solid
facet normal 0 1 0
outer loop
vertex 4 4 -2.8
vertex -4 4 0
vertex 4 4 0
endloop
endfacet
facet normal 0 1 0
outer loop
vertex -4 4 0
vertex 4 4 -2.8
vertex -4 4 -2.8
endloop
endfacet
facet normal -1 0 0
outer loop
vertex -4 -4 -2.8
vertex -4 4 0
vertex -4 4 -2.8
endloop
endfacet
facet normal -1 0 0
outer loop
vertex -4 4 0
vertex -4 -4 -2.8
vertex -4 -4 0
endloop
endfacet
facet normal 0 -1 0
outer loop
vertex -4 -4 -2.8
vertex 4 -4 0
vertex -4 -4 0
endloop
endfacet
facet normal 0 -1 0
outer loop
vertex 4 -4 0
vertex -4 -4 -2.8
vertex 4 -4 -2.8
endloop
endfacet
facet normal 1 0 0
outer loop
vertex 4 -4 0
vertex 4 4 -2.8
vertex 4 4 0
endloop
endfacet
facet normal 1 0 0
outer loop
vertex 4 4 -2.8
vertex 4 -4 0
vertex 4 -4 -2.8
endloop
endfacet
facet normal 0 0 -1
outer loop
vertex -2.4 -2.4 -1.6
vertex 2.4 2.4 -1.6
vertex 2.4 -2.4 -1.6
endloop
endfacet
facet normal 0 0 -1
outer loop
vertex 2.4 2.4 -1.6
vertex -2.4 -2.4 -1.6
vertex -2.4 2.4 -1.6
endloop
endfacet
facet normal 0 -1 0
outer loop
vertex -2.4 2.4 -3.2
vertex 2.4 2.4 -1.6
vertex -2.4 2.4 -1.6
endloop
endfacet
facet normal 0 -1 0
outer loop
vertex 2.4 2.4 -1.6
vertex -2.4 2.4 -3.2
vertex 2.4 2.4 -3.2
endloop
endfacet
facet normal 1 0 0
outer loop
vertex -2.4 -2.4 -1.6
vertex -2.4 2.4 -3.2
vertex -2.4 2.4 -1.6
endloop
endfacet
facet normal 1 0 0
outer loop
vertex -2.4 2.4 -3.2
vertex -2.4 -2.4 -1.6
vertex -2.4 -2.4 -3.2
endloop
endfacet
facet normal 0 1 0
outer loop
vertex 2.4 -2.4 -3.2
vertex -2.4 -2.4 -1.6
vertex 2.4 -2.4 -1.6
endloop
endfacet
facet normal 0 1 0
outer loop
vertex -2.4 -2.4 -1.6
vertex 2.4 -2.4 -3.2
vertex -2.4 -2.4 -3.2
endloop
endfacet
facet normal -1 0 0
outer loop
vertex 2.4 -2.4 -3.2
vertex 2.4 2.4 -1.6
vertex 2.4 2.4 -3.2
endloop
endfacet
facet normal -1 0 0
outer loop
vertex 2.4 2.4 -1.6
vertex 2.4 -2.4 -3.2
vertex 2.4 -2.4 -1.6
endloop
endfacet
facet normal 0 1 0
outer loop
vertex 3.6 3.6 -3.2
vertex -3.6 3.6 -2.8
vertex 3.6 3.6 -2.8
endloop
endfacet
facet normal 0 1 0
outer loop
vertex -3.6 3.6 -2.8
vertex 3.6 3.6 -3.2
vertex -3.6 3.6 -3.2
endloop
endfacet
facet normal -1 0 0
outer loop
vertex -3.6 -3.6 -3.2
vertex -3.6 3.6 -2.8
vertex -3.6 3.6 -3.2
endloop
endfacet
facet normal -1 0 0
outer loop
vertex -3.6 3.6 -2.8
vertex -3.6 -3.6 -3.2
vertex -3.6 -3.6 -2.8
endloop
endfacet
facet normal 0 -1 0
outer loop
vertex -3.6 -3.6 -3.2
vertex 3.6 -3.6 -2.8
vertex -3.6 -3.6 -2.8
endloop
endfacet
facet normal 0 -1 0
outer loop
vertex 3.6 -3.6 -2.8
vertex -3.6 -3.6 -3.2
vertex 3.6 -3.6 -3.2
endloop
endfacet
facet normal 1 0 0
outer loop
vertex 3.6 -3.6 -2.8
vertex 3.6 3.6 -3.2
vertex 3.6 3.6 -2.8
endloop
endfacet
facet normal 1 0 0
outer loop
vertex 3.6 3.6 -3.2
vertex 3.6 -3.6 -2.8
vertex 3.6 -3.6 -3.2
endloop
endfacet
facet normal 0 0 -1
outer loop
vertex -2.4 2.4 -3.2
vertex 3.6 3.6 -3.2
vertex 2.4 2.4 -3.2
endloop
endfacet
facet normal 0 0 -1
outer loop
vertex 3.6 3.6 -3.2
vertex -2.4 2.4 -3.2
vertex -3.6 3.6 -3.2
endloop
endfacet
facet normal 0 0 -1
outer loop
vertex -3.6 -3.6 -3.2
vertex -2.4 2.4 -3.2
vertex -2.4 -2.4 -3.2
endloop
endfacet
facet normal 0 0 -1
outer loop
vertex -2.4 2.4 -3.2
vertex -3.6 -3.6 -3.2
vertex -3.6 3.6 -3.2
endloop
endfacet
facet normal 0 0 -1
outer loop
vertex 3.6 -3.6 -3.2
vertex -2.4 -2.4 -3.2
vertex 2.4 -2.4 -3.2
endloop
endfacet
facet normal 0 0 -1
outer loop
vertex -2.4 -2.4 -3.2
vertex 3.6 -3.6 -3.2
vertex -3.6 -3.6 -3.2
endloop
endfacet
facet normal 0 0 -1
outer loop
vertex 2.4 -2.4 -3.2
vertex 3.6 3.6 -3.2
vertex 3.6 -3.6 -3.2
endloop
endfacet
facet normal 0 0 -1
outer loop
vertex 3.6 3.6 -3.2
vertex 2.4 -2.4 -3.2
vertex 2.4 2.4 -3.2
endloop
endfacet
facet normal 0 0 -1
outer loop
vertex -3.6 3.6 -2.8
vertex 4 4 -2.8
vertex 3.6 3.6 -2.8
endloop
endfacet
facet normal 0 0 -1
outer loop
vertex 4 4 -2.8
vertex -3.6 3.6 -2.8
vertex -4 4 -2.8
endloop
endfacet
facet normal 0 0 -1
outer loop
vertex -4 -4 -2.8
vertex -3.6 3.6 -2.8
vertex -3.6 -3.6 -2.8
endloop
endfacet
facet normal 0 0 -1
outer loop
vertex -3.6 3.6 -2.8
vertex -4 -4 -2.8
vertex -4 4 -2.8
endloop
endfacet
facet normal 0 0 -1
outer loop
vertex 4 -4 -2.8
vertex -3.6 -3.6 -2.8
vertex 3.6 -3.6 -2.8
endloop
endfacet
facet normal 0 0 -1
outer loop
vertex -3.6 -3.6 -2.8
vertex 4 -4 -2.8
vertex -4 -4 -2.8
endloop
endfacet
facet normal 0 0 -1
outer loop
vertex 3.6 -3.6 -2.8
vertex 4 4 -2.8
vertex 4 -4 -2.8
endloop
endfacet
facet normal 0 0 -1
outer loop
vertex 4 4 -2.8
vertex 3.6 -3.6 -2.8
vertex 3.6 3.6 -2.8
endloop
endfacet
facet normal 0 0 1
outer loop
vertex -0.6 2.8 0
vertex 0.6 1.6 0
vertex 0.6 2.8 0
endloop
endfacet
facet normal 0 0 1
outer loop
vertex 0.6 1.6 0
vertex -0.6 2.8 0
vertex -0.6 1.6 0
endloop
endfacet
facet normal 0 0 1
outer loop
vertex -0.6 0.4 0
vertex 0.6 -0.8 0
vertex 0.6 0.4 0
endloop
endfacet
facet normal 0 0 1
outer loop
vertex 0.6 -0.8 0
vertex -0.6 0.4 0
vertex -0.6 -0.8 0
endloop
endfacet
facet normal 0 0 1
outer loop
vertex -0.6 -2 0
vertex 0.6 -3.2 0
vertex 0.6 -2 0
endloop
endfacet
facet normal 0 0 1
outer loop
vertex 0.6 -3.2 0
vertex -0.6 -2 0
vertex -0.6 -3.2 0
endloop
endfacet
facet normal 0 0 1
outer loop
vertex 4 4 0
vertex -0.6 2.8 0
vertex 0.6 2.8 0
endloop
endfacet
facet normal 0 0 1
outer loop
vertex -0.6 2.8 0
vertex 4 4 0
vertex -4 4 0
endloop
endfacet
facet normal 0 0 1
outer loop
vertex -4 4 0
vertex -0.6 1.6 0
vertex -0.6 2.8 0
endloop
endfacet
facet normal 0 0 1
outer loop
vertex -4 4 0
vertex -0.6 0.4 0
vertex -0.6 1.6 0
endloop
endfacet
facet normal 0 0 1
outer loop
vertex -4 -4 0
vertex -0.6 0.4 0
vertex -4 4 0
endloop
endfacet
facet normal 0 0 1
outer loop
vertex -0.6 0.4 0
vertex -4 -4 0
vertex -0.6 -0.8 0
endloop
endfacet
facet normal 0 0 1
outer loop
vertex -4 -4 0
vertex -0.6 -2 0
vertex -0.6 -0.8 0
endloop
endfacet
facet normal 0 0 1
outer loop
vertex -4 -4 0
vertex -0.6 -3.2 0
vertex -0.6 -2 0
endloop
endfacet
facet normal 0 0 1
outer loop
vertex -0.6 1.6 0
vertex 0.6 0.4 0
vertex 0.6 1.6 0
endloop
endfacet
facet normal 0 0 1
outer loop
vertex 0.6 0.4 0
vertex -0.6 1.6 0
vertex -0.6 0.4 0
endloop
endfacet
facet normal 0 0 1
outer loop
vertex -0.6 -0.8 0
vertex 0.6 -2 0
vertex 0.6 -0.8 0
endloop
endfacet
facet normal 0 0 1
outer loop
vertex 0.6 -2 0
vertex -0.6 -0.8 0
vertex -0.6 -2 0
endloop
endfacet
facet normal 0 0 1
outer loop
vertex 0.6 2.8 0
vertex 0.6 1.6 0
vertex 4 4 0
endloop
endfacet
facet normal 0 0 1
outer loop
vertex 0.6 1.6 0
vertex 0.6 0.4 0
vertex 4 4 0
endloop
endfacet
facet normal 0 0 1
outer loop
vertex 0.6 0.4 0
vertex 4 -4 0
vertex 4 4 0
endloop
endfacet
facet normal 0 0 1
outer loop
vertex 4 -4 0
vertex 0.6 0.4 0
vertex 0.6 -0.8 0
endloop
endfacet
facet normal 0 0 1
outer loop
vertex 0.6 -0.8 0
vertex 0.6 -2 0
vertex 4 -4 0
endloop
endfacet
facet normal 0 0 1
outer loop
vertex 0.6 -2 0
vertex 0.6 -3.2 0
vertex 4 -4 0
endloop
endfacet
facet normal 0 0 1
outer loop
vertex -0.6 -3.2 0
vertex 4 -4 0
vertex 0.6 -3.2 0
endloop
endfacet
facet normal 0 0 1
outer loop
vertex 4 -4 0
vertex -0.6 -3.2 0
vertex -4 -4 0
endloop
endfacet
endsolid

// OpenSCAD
// file: ../p/box5.scad
use <../lib.scad>
function ldraw_lib__box5() = [
// 0 Box with 5 Faces and All Edges
// 0 Name: box5.dat
// 0 Author: James Jessiman
// 0 !LDRAW_ORG Primitive UPDATE 2012-01
// 0 !LICENSE Licensed under CC BY 4.0 : see CAreadme.txt
// 
// 0 BFC CERTIFY CCW
  [0,"BFC","CERTIFY"],
  [0,"BFC","CCW"],
// 
// 0 !HISTORY 2002-04-03 [sbliss] Modified for BFC compliance
// 0 !HISTORY 2002-04-25 [PTadmin] Official Update 2002-02
// 0 !HISTORY 2007-06-24 [PTadmin] Header formatted for Contributor Agreement
// 0 !HISTORY 2008-07-01 [PTadmin] Official Update 2008-01
// 0 !HISTORY 2012-02-16 [Philo] Changed to CCW
// 0 !HISTORY 2012-03-30 [PTadmin] Official Update 2012-01
// 
// 
// 2 24 1 1 1 -1 1 1
  [2,24,1,1,1,-1,1,1],
// 2 24 -1 1 1 -1 1 -1
  [2,24,-1,1,1,-1,1,-1],
// 2 24 -1 1 -1 1 1 -1
  [2,24,-1,1,-1,1,1,-1],
// 2 24 1 1 -1 1 1 1
  [2,24,1,1,-1,1,1,1],
// 2 24 1 0 1 -1 0 1
  [2,24,1,0,1,-1,0,1],
// 2 24 -1 0 1 -1 0 -1
  [2,24,-1,0,1,-1,0,-1],
// 2 24 -1 0 -1 1 0 -1
  [2,24,-1,0,-1,1,0,-1],
// 2 24 1 0 -1 1 0 1
  [2,24,1,0,-1,1,0,1],
// 2 24 1 0 1 1 1 1
  [2,24,1,0,1,1,1,1],
// 2 24 -1 0 1 -1 1 1
  [2,24,-1,0,1,-1,1,1],
// 2 24 1 0 -1 1 1 -1
  [2,24,1,0,-1,1,1,-1],
// 2 24 -1 0 -1 -1 1 -1
  [2,24,-1,0,-1,-1,1,-1],
// 4 16 -1 1 1 1 1 1 1 1 -1 -1 1 -1
  [4,16,-1,1,1,1,1,1,1,1,-1,-1,1,-1],
// 4 16 -1 1 1 -1 0 1 1 0 1 1 1 1
  [4,16,-1,1,1,-1,0,1,1,0,1,1,1,1],
// 4 16 -1 1 -1 -1 0 -1 -1 0 1 -1 1 1
  [4,16,-1,1,-1,-1,0,-1,-1,0,1,-1,1,1],
// 4 16 1 1 -1 1 0 -1 -1 0 -1 -1 1 -1
  [4,16,1,1,-1,1,0,-1,-1,0,-1,-1,1,-1],
// 4 16 1 1 1 1 0 1 1 0 -1 1 1 -1
  [4,16,1,1,1,1,0,1,1,0,-1,1,1,-1],
];
module ldraw_lib__box5(step=0, col=false, unit=2/5, alt=false, line=0.2, solid=!$preview)
    makepoly(ldraw_lib__box5(), step=step, col=col, unit=unit, alt=alt, line=line, solid=solid);
ldraw_lib__box5(line=0.2);
// file: ../p/box4.scad
use <../lib.scad>
function ldraw_lib__box4() = [
// 0 Box with 4 Faces (2 Parallel Pairs) and All Edges
// 0 Name: box4.dat
// 0 Author: James Jessiman
// 0 !LDRAW_ORG Primitive UPDATE 2012-01
// 0 !LICENSE Licensed under CC BY 4.0 : see CAreadme.txt
// 
// 0 BFC CERTIFY CCW
  [0,"BFC","CERTIFY"],
  [0,"BFC","CCW"],
// 
// 0 !HISTORY 2002-04-03 [sbliss] Modified for BFC compliance
// 0 !HISTORY 2002-04-25 [PTadmin] Official Update 2002-02
// 0 !HISTORY 2007-06-24 [PTadmin] Header formatted for Contributor Agreement
// 0 !HISTORY 2008-07-01 [PTadmin] Official Update 2008-01
// 0 !HISTORY 2012-02-16 [Philo] Changed to CCW
// 0 !HISTORY 2012-03-30 [PTadmin] Official Update 2012-01
// 
// 
// 2 24 1 1 1 -1 1 1
  [2,24,1,1,1,-1,1,1],
// 2 24 -1 1 1 -1 1 -1
  [2,24,-1,1,1,-1,1,-1],
// 2 24 -1 1 -1 1 1 -1
  [2,24,-1,1,-1,1,1,-1],
// 2 24 1 1 -1 1 1 1
  [2,24,1,1,-1,1,1,1],
// 2 24 1 0 1 -1 0 1
  [2,24,1,0,1,-1,0,1],
// 2 24 -1 0 1 -1 0 -1
  [2,24,-1,0,1,-1,0,-1],
// 2 24 -1 0 -1 1 0 -1
  [2,24,-1,0,-1,1,0,-1],
// 2 24 1 0 -1 1 0 1
  [2,24,1,0,-1,1,0,1],
// 2 24 1 0 1 1 1 1
  [2,24,1,0,1,1,1,1],
// 2 24 -1 0 1 -1 1 1
  [2,24,-1,0,1,-1,1,1],
// 2 24 1 0 -1 1 1 -1
  [2,24,1,0,-1,1,1,-1],
// 2 24 -1 0 -1 -1 1 -1
  [2,24,-1,0,-1,-1,1,-1],
// 4 16 -1 1 1 -1 0 1 1 0 1 1 1 1
  [4,16,-1,1,1,-1,0,1,1,0,1,1,1,1],
// 4 16 -1 1 -1 -1 0 -1 -1 0 1 -1 1 1
  [4,16,-1,1,-1,-1,0,-1,-1,0,1,-1,1,1],
// 4 16 1 1 -1 1 0 -1 -1 0 -1 -1 1 -1
  [4,16,1,1,-1,1,0,-1,-1,0,-1,-1,1,-1],
// 4 16 1 1 1 1 0 1 1 0 -1 1 1 -1
  [4,16,1,1,1,1,0,1,1,0,-1,1,1,-1],
];
module ldraw_lib__box4(step=0, col=false, unit=2/5, alt=false, line=0.2, solid=!$preview)
    makepoly(ldraw_lib__box4(), step=step, col=col, unit=unit, alt=alt, line=line, solid=solid);
ldraw_lib__box4(line=0.2);
// file: s/3070bs01.scad
use <../../lib.scad>
use <../../p/box4.scad>
use <../../p/box5.scad>
function ldraw_lib__s__3070bs01() = [
// 0 ~Tile  1 x  1 with Groove without Top Face
// 0 Name: s\3070bs01.dat
// 0 Author: Chris Dee [cwdee]
// 0 !LDRAW_ORG Subpart UPDATE 2009-02
// 0 !LICENSE Licensed under CC BY 4.0 : see CAreadme.txt
// 
// 0 BFC CERTIFY CCW
  [0,"BFC","CERTIFY"],
  [0,"BFC","CCW"],
// 
// 0 !HISTORY 2009-09-03 [PTadmin] Official Update 2009-02
// 
// 
// 1 16 0 0 0 10 0 0 0 7 0 0 0 10 box4.dat
  [1,16,0,0,0,10,0,0,0,7,0,0,0,10, ldraw_lib__box4()],
// 0 BFC INVERTNEXT
  [0,"BFC","INVERTNEXT"],
// 1 16 0 8 0 6 0 0 0 -4 0 0 0 6 box5.dat
  [1,16,0,8,0,6,0,0,0,-4,0,0,0,6, ldraw_lib__box5()],
// 1 16 0 7 0 9 0 0 0 1 0 0 0 9 box4.dat
  [1,16,0,7,0,9,0,0,0,1,0,0,0,9, ldraw_lib__box4()],
// 
// 4 16 9 8 9 6 8 6 -6 8 6 -9 8 9
  [4,16,9,8,9,6,8,6,-6,8,6,-9,8,9],
// 4 16 -9 8 9 -6 8 6 -6 8 -6 -9 8 -9
  [4,16,-9,8,9,-6,8,6,-6,8,-6,-9,8,-9],
// 4 16 -9 8 -9 -6 8 -6 6 8 -6 9 8 -9
  [4,16,-9,8,-9,-6,8,-6,6,8,-6,9,8,-9],
// 4 16 9 8 -9 6 8 -6 6 8 6 9 8 9
  [4,16,9,8,-9,6,8,-6,6,8,6,9,8,9],
// 
// 4 16 10 7 10 9 7 9 -9 7 9 -10 7 10
  [4,16,10,7,10,9,7,9,-9,7,9,-10,7,10],
// 4 16 -10 7 10 -9 7 9 -9 7 -9 -10 7 -10
  [4,16,-10,7,10,-9,7,9,-9,7,-9,-10,7,-10],
// 4 16 -10 7 -10 -9 7 -9 9 7 -9 10 7 -10
  [4,16,-10,7,-10,-9,7,-9,9,7,-9,10,7,-10],
// 4 16 10 7 -10 9 7 -9 9 7 9 10 7 10
  [4,16,10,7,-10,9,7,-9,9,7,9,10,7,10],
// 0
];
module ldraw_lib__s__3070bs01(step=0, col=false, unit=2/5, alt=false, line=0.2, solid=!$preview)
    makepoly(ldraw_lib__s__3070bs01(), step=step, col=col, unit=unit, alt=alt, line=line, solid=solid);
ldraw_lib__s__3070bs01(line=0.2);
// main file
use <../lib.scad>
use <s/3070bs01.scad>
function ldraw_lib__3070bp0c() = [
// 0 Tile  1 x  1 with  3 Black Squares Pattern
// 0 Name: 3070bp0c.dat
// 0 Author: Vincent Messenet [Cheenzo]
// 0 !LDRAW_ORG Part UPDATE 2019-01
// 0 !LICENSE Licensed under CC BY 4.0 : see CAreadme.txt
// 
// 0 BFC CERTIFY CCW
  [0,"BFC","CERTIFY"],
  [0,"BFC","CCW"],
// 
// 0 !KEYWORDS BrickLink 3070pb085, Minecraft, Rebrickable 3070bpr0150, Set 21120
// 0 !KEYWORDS Set 21131, set 853670
// 
// 0 !HISTORY 2019-06-28 [PTadmin] Official Update 2019-01
// 
// 
// 1 16 0 0 0 1 0 0 0 1 0 0 0 1 s\3070bs01.dat
  [1,16,0,0,0,1,0,0,0,1,0,0,0,1, ldraw_lib__s__3070bs01()],
// 4 0 -1.5 0 7 -1.5 0 4 1.5 0 4 1.5 0 7
  [4,0,-1.5,0,7,-1.5,0,4,1.5,0,4,1.5,0,7],
// 4 0 -1.5 0 1 -1.5 0 -2 1.5 0 -2 1.5 0 1
  [4,0,-1.5,0,1,-1.5,0,-2,1.5,0,-2,1.5,0,1],
// 4 0 -1.5 0 -5 -1.5 0 -8 1.5 0 -8 1.5 0 -5
  [4,0,-1.5,0,-5,-1.5,0,-8,1.5,0,-8,1.5,0,-5],
// 4 16 -10 0 10 -1.5 0 7 1.5 0 7 10 0 10
  [4,16,-10,0,10,-1.5,0,7,1.5,0,7,10,0,10],
// 3 16 -10 0 10 -1.5 0 4 -1.5 0 7
  [3,16,-10,0,10,-1.5,0,4,-1.5,0,7],
// 3 16 -10 0 10 -1.5 0 1 -1.5 0 4
  [3,16,-10,0,10,-1.5,0,1,-1.5,0,4],
// 4 16 -1.5 0 -2 -1.5 0 1 -10 0 10 -10 0 -10
  [4,16,-1.5,0,-2,-1.5,0,1,-10,0,10,-10,0,-10],
// 3 16 -10 0 -10 -1.5 0 -5 -1.5 0 -2
  [3,16,-10,0,-10,-1.5,0,-5,-1.5,0,-2],
// 3 16 -10 0 -10 -1.5 0 -8 -1.5 0 -5
  [3,16,-10,0,-10,-1.5,0,-8,-1.5,0,-5],
// 4 16 -1.5 0 4 -1.5 0 1 1.5 0 1 1.5 0 4
  [4,16,-1.5,0,4,-1.5,0,1,1.5,0,1,1.5,0,4],
// 4 16 -1.5 0 -2 -1.5 0 -5 1.5 0 -5 1.5 0 -2
  [4,16,-1.5,0,-2,-1.5,0,-5,1.5,0,-5,1.5,0,-2],
// 3 16 1.5 0 7 1.5 0 4 10 0 10
  [3,16,1.5,0,7,1.5,0,4,10,0,10],
// 3 16 1.5 0 4 1.5 0 1 10 0 10
  [3,16,1.5,0,4,1.5,0,1,10,0,10],
// 4 16 1.5 0 1 1.5 0 -2 10 0 -10 10 0 10
  [4,16,1.5,0,1,1.5,0,-2,10,0,-10,10,0,10],
// 3 16 1.5 0 -2 1.5 0 -5 10 0 -10
  [3,16,1.5,0,-2,1.5,0,-5,10,0,-10],
// 3 16 1.5 0 -5 1.5 0 -8 10 0 -10
  [3,16,1.5,0,-5,1.5,0,-8,10,0,-10],
// 4 16 -10 0 -10 10 0 -10 1.5 0 -8 -1.5 0 -8
  [4,16,-10,0,-10,10,0,-10,1.5,0,-8,-1.5,0,-8],
];
module ldraw_lib__3070bp0c(step=0, col=false, unit=2/5, alt=false, line=0.2, solid=!$preview)
    makepoly(ldraw_lib__3070bp0c(), step=step, col=col, unit=unit, alt=alt, line=line, solid=solid);
ldraw_lib__3070bp0c(line=0.2);
